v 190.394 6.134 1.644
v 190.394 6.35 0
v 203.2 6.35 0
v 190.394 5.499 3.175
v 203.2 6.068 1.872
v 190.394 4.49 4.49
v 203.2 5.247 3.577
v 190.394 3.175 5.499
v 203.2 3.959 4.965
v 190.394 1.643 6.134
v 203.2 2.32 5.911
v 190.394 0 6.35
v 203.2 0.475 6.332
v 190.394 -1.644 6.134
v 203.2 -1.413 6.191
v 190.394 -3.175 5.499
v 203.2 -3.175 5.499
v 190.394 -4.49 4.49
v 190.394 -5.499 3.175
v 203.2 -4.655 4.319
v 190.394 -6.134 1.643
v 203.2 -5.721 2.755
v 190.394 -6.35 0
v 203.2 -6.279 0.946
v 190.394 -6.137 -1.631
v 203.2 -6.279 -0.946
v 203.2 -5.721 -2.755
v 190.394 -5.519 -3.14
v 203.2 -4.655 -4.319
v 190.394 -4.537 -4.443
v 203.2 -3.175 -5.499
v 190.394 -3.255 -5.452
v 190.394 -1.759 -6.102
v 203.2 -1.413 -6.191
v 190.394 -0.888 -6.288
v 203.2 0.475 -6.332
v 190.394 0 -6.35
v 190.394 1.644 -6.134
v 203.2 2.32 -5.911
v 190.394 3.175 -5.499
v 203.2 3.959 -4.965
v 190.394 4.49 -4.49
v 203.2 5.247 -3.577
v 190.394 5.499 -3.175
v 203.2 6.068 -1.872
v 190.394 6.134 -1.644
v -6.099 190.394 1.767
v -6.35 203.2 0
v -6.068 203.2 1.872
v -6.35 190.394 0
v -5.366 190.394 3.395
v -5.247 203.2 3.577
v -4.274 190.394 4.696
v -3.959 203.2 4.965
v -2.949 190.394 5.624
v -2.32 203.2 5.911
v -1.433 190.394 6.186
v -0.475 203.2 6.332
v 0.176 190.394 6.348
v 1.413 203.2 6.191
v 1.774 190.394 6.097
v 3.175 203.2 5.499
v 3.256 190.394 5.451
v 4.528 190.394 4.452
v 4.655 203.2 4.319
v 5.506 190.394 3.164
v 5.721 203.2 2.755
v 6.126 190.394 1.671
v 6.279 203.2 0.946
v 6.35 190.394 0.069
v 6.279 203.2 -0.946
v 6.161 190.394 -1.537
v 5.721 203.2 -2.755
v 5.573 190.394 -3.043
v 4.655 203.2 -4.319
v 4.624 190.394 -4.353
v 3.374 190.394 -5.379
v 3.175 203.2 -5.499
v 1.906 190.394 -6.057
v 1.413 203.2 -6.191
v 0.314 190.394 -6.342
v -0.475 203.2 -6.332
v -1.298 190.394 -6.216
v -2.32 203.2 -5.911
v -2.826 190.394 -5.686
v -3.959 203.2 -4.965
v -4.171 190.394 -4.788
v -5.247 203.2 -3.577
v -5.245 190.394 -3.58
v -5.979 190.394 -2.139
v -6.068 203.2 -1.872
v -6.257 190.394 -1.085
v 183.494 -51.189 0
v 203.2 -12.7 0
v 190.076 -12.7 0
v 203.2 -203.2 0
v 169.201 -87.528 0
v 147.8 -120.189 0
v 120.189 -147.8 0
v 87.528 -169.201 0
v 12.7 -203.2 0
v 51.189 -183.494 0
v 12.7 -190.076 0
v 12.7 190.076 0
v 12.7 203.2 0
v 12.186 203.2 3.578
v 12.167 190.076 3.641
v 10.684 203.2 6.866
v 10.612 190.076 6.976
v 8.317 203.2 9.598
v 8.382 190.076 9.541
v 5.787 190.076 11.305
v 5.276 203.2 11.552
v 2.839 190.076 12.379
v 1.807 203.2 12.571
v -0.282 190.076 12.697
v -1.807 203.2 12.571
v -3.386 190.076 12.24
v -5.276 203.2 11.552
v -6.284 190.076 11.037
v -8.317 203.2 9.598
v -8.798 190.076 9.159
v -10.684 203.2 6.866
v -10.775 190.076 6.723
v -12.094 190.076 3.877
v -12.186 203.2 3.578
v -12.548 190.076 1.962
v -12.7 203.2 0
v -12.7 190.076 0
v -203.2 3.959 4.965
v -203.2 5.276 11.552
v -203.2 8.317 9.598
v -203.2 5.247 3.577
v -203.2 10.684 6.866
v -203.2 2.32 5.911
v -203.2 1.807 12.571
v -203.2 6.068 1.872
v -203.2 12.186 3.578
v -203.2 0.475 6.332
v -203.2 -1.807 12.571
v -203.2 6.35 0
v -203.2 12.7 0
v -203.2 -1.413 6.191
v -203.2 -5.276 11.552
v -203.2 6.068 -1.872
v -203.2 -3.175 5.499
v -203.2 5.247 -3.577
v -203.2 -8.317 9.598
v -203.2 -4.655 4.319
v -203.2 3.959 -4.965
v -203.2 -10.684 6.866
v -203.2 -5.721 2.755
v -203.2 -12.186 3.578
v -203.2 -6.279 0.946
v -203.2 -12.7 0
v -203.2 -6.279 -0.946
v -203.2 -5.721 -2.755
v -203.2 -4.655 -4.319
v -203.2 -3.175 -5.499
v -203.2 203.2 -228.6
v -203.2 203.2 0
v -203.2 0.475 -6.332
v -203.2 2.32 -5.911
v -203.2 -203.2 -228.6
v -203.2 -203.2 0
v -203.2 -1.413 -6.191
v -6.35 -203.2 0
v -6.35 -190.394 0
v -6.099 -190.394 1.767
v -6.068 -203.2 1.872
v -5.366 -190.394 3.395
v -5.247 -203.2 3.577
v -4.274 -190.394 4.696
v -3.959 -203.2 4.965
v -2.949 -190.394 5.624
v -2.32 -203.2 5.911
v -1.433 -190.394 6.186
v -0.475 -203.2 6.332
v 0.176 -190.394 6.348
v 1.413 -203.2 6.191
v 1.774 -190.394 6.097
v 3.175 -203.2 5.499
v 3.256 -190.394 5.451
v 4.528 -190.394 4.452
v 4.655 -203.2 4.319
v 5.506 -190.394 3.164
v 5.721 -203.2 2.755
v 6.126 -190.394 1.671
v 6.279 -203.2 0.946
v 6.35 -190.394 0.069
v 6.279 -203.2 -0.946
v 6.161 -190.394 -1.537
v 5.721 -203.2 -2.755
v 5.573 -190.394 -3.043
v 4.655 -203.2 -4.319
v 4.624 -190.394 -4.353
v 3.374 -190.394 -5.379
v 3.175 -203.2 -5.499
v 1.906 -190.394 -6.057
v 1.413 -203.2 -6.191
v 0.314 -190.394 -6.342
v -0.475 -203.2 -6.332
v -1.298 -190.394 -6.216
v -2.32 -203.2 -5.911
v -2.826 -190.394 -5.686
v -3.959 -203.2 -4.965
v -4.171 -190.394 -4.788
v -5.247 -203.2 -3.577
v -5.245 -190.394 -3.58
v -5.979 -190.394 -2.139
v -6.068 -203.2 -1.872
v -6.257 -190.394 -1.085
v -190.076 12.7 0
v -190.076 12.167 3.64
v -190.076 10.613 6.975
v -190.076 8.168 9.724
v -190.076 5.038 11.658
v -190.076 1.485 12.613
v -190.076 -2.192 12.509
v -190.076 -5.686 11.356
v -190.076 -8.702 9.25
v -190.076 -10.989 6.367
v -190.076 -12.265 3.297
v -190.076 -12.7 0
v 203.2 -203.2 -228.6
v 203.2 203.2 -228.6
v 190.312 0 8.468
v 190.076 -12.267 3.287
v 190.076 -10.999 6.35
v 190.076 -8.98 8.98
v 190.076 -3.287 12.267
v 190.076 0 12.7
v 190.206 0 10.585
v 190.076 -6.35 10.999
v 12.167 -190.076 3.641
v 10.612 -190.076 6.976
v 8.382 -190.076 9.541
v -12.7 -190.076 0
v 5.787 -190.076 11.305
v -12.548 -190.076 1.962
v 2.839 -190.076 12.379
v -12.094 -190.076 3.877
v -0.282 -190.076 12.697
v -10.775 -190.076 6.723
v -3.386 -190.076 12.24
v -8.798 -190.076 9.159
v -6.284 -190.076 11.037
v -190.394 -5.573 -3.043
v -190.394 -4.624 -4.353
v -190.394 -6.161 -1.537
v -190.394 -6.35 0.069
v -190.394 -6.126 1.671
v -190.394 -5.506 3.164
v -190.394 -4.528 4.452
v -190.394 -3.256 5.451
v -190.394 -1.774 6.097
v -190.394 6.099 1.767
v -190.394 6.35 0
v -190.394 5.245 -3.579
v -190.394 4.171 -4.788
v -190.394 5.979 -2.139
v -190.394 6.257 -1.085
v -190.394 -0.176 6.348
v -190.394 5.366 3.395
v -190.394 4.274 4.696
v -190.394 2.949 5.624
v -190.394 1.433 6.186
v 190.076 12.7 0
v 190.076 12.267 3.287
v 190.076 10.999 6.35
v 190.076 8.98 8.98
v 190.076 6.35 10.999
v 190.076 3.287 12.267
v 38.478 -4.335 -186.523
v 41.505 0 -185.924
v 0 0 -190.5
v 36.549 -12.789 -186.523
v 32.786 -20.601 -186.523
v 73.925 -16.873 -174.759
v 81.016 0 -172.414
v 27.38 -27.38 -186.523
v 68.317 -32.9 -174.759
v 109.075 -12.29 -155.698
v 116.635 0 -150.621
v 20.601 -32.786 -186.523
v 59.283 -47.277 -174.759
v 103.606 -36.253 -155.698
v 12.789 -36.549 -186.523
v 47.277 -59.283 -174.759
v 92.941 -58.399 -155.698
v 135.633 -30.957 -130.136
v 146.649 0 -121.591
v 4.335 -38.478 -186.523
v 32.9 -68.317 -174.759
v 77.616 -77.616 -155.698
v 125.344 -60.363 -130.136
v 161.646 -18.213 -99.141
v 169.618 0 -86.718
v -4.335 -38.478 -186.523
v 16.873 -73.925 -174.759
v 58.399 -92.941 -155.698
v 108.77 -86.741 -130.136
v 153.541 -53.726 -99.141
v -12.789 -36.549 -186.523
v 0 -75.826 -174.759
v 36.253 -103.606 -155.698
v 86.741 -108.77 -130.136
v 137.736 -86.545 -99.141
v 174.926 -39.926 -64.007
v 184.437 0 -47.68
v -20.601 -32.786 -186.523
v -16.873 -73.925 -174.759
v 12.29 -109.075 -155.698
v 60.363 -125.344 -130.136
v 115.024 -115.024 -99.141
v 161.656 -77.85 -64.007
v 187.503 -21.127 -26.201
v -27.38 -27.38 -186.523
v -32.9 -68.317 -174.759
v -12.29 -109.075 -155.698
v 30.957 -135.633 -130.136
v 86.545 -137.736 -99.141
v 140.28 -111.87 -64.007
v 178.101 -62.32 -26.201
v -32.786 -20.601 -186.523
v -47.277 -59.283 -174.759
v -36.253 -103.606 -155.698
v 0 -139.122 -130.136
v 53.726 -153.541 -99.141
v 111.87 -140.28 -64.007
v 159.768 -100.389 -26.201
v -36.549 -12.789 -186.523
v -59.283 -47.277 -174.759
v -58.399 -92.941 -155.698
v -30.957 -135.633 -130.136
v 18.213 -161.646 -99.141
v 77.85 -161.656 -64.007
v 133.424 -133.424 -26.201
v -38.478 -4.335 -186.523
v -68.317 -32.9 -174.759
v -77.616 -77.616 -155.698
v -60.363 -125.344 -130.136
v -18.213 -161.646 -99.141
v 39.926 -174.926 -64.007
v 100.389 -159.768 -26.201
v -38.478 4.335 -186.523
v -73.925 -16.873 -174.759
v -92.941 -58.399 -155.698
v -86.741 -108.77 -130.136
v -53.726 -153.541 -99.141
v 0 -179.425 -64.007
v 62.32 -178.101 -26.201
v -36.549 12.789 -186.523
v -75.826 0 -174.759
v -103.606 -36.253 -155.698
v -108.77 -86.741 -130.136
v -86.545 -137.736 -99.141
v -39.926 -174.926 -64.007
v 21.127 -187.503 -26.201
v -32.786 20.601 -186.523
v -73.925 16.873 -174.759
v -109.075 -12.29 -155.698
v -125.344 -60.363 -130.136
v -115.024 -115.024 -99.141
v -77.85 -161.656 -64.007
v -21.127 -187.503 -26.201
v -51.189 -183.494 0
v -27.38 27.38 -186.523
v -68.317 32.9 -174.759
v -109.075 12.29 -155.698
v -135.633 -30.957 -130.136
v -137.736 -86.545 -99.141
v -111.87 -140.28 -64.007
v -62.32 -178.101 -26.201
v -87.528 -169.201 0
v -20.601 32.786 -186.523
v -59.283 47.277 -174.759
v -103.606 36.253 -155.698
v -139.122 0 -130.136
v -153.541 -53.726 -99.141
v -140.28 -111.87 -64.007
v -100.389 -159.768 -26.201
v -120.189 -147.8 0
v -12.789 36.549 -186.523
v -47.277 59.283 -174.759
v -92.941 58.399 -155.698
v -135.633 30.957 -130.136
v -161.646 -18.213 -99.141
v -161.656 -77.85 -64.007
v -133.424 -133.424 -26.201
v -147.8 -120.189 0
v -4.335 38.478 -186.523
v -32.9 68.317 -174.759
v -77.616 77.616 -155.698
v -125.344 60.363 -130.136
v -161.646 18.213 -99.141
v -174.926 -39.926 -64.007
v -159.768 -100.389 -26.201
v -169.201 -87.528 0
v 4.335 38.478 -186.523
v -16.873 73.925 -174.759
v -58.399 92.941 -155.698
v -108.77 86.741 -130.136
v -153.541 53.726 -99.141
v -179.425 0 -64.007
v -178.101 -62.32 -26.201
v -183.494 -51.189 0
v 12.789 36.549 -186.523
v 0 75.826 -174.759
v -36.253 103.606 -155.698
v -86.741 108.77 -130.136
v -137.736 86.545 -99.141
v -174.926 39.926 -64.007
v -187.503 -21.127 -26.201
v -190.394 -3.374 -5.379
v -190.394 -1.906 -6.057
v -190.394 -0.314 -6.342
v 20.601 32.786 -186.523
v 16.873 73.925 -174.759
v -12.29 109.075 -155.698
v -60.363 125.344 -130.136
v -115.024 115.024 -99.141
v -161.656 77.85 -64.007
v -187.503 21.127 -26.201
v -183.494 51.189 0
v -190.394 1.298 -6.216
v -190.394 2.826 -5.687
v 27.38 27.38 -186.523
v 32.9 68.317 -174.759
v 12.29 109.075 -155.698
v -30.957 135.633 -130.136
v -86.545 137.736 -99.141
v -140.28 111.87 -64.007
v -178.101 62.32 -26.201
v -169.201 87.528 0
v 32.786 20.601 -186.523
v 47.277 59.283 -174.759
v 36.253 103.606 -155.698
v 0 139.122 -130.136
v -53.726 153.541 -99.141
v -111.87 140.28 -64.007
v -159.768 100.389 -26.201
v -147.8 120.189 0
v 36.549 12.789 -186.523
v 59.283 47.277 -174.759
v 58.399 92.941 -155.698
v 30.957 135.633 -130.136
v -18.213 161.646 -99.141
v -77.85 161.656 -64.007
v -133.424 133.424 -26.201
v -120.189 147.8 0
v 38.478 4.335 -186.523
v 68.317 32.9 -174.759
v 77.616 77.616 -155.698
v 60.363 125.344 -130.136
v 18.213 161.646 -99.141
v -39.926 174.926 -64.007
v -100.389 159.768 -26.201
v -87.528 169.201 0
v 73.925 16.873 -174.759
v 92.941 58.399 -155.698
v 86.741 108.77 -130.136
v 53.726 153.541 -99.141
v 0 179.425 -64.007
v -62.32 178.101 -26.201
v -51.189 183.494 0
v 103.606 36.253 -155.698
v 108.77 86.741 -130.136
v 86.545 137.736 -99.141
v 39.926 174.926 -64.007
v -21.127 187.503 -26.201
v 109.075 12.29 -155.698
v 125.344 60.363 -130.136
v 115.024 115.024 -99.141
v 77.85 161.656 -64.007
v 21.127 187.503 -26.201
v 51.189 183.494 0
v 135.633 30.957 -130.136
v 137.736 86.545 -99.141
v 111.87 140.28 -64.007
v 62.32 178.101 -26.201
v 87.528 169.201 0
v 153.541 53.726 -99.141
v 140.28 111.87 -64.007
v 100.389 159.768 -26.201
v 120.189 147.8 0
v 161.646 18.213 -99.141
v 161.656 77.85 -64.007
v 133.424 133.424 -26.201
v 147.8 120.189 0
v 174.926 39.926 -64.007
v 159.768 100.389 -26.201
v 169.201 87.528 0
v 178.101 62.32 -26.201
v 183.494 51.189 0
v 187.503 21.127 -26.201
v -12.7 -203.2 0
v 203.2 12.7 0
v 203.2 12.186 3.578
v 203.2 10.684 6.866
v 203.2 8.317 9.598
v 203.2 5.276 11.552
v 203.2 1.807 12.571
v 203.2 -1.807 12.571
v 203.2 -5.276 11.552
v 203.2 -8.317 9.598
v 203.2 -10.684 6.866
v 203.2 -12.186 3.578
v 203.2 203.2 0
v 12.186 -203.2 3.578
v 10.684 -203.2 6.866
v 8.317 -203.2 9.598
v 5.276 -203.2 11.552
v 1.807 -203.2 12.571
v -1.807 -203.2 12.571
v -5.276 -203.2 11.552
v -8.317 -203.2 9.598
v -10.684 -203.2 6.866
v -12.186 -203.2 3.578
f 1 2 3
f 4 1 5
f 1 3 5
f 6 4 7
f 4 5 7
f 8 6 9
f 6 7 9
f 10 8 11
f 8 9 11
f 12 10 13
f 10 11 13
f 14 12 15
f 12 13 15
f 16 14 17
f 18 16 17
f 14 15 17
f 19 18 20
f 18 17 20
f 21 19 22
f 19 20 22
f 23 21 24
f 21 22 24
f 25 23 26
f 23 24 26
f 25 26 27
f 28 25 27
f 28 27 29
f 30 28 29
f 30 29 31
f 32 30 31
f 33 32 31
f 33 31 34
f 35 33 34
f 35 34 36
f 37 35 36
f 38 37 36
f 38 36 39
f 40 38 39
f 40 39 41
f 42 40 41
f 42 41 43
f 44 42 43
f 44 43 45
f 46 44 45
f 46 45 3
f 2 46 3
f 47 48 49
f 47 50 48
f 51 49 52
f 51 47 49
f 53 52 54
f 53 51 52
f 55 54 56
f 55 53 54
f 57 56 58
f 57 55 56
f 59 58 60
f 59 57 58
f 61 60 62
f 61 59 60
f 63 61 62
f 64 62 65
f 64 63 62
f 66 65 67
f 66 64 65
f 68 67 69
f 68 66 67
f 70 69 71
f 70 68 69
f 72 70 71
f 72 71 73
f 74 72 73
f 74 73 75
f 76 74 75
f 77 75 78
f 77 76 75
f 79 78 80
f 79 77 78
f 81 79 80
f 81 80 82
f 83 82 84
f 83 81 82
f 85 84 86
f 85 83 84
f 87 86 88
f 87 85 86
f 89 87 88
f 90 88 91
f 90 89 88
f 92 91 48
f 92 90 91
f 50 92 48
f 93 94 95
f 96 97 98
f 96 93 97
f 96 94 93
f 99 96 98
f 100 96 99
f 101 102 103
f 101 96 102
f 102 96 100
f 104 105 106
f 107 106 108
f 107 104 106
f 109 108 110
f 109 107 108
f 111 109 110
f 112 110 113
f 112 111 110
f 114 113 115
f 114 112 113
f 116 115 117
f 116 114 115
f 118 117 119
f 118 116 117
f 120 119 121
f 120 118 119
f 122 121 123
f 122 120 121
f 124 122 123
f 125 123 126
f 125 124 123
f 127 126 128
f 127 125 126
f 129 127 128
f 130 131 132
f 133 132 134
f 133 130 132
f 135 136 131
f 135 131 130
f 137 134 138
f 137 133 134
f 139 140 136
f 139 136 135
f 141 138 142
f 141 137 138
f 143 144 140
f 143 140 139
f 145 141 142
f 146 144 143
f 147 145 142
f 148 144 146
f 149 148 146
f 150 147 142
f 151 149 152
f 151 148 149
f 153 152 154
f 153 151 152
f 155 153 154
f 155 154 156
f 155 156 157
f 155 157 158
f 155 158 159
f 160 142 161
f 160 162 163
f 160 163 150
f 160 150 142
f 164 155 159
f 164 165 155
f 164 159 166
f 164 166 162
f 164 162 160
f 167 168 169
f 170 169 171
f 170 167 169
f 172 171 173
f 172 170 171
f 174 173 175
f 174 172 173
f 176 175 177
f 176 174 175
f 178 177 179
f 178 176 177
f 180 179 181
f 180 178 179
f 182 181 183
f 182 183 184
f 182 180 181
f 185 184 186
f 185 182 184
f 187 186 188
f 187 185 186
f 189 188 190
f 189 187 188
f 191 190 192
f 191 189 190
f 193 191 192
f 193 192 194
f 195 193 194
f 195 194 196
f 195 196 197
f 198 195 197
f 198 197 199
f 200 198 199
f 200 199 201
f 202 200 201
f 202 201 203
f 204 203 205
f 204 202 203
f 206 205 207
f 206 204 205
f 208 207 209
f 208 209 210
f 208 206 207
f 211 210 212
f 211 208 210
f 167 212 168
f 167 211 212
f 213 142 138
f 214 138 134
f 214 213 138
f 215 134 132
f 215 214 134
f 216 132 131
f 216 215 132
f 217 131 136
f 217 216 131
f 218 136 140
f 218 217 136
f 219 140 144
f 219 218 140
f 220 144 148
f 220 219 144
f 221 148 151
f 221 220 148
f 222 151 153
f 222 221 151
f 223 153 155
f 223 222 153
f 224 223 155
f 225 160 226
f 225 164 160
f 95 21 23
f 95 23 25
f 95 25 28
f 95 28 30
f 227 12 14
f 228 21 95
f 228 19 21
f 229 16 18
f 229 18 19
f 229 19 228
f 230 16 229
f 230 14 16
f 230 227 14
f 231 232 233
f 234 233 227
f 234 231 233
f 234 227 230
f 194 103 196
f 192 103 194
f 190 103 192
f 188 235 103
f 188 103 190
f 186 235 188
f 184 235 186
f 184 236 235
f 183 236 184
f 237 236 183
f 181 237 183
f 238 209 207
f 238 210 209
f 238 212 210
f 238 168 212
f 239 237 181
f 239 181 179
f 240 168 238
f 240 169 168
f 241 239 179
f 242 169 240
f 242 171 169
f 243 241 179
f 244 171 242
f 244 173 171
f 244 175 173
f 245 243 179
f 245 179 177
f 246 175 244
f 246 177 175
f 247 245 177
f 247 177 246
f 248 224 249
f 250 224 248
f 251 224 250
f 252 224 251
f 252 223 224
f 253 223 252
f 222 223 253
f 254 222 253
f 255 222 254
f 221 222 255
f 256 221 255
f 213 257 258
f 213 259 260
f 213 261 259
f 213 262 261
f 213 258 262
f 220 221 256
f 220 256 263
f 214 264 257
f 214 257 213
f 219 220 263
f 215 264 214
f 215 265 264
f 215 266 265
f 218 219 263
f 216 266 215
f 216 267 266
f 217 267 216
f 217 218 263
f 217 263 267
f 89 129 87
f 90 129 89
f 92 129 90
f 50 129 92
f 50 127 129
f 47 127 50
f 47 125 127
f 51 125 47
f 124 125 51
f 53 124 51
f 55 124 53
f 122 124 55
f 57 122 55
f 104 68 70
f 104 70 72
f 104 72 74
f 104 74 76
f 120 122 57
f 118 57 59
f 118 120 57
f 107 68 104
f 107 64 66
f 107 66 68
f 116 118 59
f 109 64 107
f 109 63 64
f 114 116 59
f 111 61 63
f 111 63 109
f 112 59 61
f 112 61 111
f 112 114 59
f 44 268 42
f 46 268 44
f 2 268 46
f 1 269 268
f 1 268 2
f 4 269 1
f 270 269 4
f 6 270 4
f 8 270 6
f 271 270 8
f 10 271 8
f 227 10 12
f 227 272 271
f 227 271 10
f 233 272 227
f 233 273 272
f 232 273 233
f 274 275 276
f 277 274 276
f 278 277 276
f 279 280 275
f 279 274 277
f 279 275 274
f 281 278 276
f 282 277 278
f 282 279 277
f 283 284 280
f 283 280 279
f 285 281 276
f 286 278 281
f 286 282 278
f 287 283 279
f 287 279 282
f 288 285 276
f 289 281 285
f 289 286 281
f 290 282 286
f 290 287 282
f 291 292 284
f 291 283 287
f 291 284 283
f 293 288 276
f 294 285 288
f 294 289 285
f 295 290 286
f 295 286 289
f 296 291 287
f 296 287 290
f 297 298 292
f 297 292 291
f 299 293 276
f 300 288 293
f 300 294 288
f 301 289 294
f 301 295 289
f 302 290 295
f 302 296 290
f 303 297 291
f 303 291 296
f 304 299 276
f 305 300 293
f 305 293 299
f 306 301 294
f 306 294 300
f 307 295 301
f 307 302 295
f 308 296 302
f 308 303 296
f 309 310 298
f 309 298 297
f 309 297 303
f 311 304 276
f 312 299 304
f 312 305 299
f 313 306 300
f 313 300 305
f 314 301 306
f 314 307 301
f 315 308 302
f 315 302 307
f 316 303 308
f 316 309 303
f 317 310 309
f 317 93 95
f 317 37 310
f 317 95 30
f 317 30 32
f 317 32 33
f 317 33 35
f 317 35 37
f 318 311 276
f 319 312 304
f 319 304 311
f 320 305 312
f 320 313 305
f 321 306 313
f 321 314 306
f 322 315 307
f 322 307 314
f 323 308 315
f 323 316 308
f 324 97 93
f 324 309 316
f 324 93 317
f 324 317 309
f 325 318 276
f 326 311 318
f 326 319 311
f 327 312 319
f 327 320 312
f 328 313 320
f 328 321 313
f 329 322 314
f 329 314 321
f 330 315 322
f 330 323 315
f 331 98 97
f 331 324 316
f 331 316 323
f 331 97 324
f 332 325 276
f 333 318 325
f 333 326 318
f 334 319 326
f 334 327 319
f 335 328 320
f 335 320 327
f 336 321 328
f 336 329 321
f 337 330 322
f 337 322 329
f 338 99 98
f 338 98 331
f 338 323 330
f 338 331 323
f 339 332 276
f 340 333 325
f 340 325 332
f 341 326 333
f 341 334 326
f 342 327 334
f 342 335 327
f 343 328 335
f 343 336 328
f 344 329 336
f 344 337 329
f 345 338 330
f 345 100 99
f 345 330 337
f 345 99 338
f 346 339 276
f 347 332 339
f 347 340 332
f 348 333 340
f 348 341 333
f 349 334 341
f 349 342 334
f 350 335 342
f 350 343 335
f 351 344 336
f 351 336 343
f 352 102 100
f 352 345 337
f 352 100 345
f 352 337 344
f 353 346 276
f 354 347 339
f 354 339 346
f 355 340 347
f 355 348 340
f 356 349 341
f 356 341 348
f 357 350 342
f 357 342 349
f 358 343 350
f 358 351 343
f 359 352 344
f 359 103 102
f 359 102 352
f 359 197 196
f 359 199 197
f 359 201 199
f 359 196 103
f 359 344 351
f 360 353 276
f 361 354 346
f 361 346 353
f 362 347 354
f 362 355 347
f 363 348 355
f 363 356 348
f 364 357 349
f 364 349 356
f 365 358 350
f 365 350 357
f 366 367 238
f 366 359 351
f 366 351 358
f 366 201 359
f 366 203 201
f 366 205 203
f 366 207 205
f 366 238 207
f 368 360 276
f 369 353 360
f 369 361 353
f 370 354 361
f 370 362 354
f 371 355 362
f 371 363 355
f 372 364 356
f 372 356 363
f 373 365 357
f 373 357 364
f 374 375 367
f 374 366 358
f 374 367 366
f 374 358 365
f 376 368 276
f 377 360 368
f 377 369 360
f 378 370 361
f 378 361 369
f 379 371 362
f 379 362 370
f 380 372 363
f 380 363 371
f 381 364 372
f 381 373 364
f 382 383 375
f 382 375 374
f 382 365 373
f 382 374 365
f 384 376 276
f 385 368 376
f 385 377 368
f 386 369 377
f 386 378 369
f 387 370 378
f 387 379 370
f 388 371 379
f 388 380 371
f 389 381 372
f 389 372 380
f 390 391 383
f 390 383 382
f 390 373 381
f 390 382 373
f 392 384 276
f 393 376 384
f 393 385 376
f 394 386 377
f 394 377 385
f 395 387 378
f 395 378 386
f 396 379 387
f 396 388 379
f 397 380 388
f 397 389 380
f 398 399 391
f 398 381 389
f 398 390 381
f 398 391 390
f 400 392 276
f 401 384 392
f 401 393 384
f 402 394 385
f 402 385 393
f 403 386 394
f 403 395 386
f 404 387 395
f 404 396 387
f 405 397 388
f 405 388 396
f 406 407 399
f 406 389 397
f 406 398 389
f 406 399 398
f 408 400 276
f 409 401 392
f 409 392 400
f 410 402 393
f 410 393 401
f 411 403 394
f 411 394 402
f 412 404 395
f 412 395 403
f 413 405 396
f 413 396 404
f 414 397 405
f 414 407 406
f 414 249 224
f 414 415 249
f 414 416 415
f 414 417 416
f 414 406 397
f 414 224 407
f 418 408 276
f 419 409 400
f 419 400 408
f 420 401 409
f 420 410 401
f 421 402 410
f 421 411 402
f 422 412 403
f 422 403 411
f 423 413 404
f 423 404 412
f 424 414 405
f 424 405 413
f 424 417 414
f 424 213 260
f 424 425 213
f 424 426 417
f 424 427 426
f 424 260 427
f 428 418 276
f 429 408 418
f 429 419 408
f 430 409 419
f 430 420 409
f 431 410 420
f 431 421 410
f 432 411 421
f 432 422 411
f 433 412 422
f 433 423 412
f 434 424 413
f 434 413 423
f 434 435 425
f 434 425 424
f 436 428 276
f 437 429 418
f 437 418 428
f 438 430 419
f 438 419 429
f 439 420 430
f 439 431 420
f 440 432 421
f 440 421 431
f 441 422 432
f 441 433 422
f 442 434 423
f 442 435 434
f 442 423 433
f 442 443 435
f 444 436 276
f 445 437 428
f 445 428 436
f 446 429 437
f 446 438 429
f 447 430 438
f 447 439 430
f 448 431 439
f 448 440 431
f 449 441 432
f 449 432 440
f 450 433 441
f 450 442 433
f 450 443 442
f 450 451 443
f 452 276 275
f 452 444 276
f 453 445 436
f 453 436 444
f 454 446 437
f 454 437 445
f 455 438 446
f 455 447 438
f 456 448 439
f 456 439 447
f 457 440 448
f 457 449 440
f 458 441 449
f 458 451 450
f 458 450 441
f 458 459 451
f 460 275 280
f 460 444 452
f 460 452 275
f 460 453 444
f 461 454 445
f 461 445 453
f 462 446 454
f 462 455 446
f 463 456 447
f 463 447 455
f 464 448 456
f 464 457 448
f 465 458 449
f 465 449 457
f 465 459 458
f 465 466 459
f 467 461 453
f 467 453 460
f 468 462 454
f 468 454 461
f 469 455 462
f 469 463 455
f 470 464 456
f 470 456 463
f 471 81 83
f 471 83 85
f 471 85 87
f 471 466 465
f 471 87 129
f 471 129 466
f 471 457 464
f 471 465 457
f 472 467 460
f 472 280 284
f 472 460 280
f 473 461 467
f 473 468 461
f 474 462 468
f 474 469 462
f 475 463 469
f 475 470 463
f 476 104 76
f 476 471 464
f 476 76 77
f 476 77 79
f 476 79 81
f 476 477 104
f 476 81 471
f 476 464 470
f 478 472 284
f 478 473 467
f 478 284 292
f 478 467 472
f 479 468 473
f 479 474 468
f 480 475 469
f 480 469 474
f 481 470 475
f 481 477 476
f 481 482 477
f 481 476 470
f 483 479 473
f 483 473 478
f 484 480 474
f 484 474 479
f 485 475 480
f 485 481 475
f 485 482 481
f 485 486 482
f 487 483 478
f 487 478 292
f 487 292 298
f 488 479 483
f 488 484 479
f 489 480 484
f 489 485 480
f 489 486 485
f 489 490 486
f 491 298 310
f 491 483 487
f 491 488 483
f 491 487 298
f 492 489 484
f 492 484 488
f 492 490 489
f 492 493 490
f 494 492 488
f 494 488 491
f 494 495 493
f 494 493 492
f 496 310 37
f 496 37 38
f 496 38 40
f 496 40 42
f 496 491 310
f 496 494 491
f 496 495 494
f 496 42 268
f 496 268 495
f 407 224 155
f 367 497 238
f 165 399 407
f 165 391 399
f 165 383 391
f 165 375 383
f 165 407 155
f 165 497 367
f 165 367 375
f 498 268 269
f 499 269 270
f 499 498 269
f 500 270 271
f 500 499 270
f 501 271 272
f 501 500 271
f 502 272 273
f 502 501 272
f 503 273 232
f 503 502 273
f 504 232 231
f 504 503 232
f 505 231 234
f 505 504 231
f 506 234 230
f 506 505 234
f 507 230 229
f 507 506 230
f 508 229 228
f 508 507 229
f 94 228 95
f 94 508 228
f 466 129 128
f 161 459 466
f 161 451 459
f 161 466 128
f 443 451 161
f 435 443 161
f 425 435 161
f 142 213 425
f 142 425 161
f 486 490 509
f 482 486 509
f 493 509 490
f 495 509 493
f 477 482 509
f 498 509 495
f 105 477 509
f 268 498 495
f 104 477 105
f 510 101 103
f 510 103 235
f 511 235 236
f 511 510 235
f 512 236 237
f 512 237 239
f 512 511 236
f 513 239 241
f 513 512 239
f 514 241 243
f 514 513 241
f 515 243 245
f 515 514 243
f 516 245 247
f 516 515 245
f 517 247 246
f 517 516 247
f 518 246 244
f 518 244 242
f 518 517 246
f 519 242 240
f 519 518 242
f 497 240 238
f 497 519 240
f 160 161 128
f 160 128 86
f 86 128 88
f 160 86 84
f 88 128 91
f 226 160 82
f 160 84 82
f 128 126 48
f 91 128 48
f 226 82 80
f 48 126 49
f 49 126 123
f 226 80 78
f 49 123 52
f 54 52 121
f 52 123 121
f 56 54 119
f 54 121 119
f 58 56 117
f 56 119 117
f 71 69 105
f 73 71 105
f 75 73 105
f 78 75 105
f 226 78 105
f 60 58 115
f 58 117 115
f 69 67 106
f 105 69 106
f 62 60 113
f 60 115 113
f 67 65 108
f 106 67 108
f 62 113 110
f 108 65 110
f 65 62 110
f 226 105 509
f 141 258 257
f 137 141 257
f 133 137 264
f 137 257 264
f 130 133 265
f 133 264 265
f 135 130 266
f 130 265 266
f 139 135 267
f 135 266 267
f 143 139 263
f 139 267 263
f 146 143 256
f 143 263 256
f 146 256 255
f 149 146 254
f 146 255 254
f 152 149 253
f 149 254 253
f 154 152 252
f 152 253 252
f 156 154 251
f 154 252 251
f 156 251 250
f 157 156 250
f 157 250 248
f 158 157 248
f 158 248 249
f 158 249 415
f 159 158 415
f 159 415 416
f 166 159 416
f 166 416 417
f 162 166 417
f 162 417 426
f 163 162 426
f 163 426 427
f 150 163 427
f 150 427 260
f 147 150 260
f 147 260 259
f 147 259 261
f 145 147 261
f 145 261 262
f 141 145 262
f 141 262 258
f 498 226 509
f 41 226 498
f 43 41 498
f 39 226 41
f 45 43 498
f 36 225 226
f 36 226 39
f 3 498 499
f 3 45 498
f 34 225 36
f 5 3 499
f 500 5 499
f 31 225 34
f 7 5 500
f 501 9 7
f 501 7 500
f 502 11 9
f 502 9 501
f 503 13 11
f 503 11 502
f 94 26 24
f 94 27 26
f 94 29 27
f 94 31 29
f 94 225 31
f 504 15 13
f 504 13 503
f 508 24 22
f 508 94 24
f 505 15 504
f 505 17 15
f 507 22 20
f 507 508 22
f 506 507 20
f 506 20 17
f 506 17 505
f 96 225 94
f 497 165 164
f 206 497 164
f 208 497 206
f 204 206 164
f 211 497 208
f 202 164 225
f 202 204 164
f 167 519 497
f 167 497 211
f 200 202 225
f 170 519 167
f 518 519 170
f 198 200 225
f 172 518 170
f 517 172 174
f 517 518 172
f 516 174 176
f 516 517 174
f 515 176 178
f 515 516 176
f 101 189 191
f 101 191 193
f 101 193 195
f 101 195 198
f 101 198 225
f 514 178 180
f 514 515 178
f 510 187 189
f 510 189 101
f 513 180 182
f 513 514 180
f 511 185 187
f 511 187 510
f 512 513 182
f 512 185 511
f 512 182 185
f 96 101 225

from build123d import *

# Parameters (mm, degrees)
F1_DEPTH      = 203.2
F1_DEPTH_BACK = 203.2
F4_DEPTH      = 406.4
F5_R          = 6.35
F6_DEPTH      = 406.4


# Not quite as in the source:
# - a feature names something its author has since deleted; it is built from what else it names


with BuildPart() as f1:
    # F0 (on Front) → F1 (new body, two sides)
    with BuildSketch(Plane.XZ) as f1_sk:
        with BuildLine():
            Line((203.2, 0), (12.7, 0))
            ThreePointArc((12.7, 0), (0, -12.7), (-12.7, 0))
            Line((-12.7, 0), (-203.2, 0))
            Line((-203.2, 0), (-203.2, -228.6))
            Line((-203.2, -228.6), (203.2, -228.6))
            Line((203.2, -228.6), (203.2, 0))
        make_face()
        with BuildLine():
            Line((12.7, 0), (6.35, 0))
            ThreePointArc((6.35, 0), (0, -6.35), (-6.35, 0))
            Line((-6.35, 0), (-12.7, 0))
            ThreePointArc((-12.7, 0), (0, -12.7), (12.7, 0))
        make_face()
        with BuildLine():
            ThreePointArc((-6.35, 0), (0, 6.35), (6.35, 0))
            Line((6.35, 0), (12.7, 0))
            ThreePointArc((12.7, 0), (0, 12.7), (-12.7, 0))
            Line((-12.7, 0), (-6.35, 0))
        make_face()
    extrude(amount=F1_DEPTH)
    extrude(f1_sk.sketch, amount=-F1_DEPTH_BACK)

    # F3 (on face) → F4 (join)
    with BuildSketch(Plane.YZ.offset(203.2)):
        with BuildLine():
            Line((-12.7, 0), (12.7, 0))
            ThreePointArc((12.7, 0), (0, 12.7), (-12.7, 0))
        make_face()
        with BuildLine():
            ThreePointArc((-12.7, 0), (0, -12.7), (12.7, 0))
            Line((12.7, 0), (-12.7, 0))
        make_face()
    extrude(amount=-F4_DEPTH)

    # F5 (on face) → F6 (cut)
    with BuildSketch(Plane.YZ.offset(203.2)):
        Circle(F5_R)
    extrude(amount=-F6_DEPTH, mode=Mode.SUBTRACT)

    # F2 (on Front) → F7 (revolve, cut)
    with BuildSketch(Plane.XZ):
        with BuildLine():
            Line((0, 190.5), (0, -190.5))
            ThreePointArc((0, -190.5), (190.5, 0), (0, 190.5))
        make_face()
    revolve(axis=Axis((0, 0, 0), (0, 0, -1)), mode=Mode.SUBTRACT)


solid = f1.part
